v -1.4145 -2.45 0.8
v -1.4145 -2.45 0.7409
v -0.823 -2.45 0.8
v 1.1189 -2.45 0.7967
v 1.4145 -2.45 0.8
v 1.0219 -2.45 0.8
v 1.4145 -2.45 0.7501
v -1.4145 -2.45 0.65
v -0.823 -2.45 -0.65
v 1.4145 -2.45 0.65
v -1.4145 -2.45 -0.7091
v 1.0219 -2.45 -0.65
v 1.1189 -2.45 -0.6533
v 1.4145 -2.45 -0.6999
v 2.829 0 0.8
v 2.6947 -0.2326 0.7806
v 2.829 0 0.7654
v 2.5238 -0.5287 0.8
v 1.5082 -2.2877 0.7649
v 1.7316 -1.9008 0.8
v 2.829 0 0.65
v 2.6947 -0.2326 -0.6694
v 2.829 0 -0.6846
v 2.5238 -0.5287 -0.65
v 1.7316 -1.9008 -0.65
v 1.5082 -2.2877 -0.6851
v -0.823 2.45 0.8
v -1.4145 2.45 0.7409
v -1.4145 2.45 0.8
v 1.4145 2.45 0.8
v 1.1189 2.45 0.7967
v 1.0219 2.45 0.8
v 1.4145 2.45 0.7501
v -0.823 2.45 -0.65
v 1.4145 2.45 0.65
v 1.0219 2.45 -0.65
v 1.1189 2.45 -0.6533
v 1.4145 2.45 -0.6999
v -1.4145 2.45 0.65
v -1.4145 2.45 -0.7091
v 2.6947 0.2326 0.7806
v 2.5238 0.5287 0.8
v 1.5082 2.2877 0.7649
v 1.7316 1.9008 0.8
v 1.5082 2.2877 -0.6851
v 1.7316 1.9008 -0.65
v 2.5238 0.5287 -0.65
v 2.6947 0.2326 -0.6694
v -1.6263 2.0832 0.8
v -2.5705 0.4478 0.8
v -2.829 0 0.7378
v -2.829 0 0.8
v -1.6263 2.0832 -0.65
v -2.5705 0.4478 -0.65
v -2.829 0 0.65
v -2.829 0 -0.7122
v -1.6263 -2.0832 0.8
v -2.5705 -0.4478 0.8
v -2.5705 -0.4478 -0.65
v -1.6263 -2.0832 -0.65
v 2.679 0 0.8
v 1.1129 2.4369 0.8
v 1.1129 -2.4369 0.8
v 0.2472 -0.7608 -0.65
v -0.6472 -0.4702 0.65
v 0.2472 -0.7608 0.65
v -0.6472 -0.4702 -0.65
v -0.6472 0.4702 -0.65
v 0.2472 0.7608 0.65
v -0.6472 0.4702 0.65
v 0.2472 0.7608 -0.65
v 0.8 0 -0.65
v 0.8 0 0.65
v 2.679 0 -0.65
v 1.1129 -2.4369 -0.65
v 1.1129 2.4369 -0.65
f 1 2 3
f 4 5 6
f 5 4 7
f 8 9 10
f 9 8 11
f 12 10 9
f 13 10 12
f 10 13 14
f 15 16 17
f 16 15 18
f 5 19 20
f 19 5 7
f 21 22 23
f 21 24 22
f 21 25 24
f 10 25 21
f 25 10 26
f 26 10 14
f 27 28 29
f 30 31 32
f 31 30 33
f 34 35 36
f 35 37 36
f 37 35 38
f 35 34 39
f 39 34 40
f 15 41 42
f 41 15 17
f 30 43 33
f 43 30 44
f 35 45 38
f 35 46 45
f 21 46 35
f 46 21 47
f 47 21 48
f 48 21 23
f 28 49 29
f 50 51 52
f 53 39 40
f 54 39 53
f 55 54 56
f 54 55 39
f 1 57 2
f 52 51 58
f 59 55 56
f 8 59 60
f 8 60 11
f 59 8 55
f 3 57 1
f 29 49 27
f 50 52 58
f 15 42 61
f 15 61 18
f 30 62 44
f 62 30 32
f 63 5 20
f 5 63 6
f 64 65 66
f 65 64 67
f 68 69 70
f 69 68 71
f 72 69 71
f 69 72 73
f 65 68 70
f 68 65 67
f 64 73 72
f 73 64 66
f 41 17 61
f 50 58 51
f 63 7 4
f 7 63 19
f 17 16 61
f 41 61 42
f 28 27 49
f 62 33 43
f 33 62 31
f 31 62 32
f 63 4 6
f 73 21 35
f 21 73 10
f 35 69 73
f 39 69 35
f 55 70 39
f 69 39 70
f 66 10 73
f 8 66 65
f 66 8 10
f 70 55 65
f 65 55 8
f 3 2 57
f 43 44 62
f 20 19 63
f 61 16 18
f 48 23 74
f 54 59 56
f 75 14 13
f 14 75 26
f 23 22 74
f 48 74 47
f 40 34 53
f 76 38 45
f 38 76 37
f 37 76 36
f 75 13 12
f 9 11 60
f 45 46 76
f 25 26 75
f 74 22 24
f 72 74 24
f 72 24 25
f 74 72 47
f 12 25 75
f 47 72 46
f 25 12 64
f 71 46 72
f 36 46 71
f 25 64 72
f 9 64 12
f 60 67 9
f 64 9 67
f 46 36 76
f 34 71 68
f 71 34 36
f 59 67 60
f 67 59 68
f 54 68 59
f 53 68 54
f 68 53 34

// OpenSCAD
// Parameters
thread_diameter = 2; //[1:4:0.1]
thread_pitch = 0.4; //[0.2:0.8:0.05]
across_flats = 4.9; //[2.45:9.8:0.05]
thickness = 1.6; //[0.8:3.2:0.05]
hole_style = 0; //[0:1:1]
clearance_extra = 0.2; //[0.05:0.6:0.05]
tap_minor_factor = 0.8; //[0.6:0.95:0.01]
chamfer_size = 0.15; //[0.05:0.4:0.01]
overlap = 0.5; //[0.2:2:0.1]
washer_enabled = 0; //[0:1:1]
washer_outer_diameter = 5; //[2.5:10:0.1]
washer_thickness = 0.5; //[0.25:1.5:0.05]

// Nut and Washer Module
module nut_and_washer() {
  // Hex Nut Body
  module hex_nut_body() {
    color("DimGray") {
      cylinder(r=across_flats/(2*cos(30)), h=thickness, center=true, $fn=6);
    }
  }

  // Central Thread Hole
  module central_thread_hole() {
    cylinder(r=((thread_diameter*tap_minor_factor)*(1-hole_style) + (thread_diameter+clearance_extra)*hole_style)/2, 
             h=thickness + 2*overlap, center=true);
  }

  // Top and Bottom Edge Chamfer
  module top_bottom_edge_chamfer() {
    cylinder(r1=across_flats/(2*cos(30)) + overlap, 
             r2=across_flats/(2*cos(30)) - chamfer_size, 
             h=chamfer_size, center=true);
  }

  // Washer Outer
  module washer_outer() {
    color("Silver") {
      cylinder(r=washer_outer_diameter/2, h=washer_thickness, center=true);
    }
  }

  // Washer Inner Hole
  module washer_inner_hole() {
    cylinder(r=((thread_diameter*tap_minor_factor)*(1-hole_style) + (thread_diameter+clearance_extra)*hole_style)/2, 
             h=washer_thickness + 2*overlap, center=true);
  }

  // Nut with Chamfers
  module nut_with_chamfers() {
    difference() {
      hex_nut_body();
      central_thread_hole();
      translate([0, 0, thickness/2 - chamfer_size/2]) top_bottom_edge_chamfer();
      translate([0, 0, -thickness/2 + chamfer_size/2]) top_bottom_edge_chamfer();
    }
  }

  // Washer Minus Hole
  module washer_minus_hole() {
    difference() {
      washer_outer();
      washer_inner_hole();
    }
  }

  // Final Nut and Washer Assembly
  if (washer_enabled) {
    union() {
      nut_with_chamfers();
      translate([0, 0, -thickness/2 - washer_thickness/2 + overlap]) washer_minus_hole();
    }
  } else {
    nut_with_chamfers();
  }
}

// Assembly
module assembly() {
  nut_and_washer();
}

assembly();
